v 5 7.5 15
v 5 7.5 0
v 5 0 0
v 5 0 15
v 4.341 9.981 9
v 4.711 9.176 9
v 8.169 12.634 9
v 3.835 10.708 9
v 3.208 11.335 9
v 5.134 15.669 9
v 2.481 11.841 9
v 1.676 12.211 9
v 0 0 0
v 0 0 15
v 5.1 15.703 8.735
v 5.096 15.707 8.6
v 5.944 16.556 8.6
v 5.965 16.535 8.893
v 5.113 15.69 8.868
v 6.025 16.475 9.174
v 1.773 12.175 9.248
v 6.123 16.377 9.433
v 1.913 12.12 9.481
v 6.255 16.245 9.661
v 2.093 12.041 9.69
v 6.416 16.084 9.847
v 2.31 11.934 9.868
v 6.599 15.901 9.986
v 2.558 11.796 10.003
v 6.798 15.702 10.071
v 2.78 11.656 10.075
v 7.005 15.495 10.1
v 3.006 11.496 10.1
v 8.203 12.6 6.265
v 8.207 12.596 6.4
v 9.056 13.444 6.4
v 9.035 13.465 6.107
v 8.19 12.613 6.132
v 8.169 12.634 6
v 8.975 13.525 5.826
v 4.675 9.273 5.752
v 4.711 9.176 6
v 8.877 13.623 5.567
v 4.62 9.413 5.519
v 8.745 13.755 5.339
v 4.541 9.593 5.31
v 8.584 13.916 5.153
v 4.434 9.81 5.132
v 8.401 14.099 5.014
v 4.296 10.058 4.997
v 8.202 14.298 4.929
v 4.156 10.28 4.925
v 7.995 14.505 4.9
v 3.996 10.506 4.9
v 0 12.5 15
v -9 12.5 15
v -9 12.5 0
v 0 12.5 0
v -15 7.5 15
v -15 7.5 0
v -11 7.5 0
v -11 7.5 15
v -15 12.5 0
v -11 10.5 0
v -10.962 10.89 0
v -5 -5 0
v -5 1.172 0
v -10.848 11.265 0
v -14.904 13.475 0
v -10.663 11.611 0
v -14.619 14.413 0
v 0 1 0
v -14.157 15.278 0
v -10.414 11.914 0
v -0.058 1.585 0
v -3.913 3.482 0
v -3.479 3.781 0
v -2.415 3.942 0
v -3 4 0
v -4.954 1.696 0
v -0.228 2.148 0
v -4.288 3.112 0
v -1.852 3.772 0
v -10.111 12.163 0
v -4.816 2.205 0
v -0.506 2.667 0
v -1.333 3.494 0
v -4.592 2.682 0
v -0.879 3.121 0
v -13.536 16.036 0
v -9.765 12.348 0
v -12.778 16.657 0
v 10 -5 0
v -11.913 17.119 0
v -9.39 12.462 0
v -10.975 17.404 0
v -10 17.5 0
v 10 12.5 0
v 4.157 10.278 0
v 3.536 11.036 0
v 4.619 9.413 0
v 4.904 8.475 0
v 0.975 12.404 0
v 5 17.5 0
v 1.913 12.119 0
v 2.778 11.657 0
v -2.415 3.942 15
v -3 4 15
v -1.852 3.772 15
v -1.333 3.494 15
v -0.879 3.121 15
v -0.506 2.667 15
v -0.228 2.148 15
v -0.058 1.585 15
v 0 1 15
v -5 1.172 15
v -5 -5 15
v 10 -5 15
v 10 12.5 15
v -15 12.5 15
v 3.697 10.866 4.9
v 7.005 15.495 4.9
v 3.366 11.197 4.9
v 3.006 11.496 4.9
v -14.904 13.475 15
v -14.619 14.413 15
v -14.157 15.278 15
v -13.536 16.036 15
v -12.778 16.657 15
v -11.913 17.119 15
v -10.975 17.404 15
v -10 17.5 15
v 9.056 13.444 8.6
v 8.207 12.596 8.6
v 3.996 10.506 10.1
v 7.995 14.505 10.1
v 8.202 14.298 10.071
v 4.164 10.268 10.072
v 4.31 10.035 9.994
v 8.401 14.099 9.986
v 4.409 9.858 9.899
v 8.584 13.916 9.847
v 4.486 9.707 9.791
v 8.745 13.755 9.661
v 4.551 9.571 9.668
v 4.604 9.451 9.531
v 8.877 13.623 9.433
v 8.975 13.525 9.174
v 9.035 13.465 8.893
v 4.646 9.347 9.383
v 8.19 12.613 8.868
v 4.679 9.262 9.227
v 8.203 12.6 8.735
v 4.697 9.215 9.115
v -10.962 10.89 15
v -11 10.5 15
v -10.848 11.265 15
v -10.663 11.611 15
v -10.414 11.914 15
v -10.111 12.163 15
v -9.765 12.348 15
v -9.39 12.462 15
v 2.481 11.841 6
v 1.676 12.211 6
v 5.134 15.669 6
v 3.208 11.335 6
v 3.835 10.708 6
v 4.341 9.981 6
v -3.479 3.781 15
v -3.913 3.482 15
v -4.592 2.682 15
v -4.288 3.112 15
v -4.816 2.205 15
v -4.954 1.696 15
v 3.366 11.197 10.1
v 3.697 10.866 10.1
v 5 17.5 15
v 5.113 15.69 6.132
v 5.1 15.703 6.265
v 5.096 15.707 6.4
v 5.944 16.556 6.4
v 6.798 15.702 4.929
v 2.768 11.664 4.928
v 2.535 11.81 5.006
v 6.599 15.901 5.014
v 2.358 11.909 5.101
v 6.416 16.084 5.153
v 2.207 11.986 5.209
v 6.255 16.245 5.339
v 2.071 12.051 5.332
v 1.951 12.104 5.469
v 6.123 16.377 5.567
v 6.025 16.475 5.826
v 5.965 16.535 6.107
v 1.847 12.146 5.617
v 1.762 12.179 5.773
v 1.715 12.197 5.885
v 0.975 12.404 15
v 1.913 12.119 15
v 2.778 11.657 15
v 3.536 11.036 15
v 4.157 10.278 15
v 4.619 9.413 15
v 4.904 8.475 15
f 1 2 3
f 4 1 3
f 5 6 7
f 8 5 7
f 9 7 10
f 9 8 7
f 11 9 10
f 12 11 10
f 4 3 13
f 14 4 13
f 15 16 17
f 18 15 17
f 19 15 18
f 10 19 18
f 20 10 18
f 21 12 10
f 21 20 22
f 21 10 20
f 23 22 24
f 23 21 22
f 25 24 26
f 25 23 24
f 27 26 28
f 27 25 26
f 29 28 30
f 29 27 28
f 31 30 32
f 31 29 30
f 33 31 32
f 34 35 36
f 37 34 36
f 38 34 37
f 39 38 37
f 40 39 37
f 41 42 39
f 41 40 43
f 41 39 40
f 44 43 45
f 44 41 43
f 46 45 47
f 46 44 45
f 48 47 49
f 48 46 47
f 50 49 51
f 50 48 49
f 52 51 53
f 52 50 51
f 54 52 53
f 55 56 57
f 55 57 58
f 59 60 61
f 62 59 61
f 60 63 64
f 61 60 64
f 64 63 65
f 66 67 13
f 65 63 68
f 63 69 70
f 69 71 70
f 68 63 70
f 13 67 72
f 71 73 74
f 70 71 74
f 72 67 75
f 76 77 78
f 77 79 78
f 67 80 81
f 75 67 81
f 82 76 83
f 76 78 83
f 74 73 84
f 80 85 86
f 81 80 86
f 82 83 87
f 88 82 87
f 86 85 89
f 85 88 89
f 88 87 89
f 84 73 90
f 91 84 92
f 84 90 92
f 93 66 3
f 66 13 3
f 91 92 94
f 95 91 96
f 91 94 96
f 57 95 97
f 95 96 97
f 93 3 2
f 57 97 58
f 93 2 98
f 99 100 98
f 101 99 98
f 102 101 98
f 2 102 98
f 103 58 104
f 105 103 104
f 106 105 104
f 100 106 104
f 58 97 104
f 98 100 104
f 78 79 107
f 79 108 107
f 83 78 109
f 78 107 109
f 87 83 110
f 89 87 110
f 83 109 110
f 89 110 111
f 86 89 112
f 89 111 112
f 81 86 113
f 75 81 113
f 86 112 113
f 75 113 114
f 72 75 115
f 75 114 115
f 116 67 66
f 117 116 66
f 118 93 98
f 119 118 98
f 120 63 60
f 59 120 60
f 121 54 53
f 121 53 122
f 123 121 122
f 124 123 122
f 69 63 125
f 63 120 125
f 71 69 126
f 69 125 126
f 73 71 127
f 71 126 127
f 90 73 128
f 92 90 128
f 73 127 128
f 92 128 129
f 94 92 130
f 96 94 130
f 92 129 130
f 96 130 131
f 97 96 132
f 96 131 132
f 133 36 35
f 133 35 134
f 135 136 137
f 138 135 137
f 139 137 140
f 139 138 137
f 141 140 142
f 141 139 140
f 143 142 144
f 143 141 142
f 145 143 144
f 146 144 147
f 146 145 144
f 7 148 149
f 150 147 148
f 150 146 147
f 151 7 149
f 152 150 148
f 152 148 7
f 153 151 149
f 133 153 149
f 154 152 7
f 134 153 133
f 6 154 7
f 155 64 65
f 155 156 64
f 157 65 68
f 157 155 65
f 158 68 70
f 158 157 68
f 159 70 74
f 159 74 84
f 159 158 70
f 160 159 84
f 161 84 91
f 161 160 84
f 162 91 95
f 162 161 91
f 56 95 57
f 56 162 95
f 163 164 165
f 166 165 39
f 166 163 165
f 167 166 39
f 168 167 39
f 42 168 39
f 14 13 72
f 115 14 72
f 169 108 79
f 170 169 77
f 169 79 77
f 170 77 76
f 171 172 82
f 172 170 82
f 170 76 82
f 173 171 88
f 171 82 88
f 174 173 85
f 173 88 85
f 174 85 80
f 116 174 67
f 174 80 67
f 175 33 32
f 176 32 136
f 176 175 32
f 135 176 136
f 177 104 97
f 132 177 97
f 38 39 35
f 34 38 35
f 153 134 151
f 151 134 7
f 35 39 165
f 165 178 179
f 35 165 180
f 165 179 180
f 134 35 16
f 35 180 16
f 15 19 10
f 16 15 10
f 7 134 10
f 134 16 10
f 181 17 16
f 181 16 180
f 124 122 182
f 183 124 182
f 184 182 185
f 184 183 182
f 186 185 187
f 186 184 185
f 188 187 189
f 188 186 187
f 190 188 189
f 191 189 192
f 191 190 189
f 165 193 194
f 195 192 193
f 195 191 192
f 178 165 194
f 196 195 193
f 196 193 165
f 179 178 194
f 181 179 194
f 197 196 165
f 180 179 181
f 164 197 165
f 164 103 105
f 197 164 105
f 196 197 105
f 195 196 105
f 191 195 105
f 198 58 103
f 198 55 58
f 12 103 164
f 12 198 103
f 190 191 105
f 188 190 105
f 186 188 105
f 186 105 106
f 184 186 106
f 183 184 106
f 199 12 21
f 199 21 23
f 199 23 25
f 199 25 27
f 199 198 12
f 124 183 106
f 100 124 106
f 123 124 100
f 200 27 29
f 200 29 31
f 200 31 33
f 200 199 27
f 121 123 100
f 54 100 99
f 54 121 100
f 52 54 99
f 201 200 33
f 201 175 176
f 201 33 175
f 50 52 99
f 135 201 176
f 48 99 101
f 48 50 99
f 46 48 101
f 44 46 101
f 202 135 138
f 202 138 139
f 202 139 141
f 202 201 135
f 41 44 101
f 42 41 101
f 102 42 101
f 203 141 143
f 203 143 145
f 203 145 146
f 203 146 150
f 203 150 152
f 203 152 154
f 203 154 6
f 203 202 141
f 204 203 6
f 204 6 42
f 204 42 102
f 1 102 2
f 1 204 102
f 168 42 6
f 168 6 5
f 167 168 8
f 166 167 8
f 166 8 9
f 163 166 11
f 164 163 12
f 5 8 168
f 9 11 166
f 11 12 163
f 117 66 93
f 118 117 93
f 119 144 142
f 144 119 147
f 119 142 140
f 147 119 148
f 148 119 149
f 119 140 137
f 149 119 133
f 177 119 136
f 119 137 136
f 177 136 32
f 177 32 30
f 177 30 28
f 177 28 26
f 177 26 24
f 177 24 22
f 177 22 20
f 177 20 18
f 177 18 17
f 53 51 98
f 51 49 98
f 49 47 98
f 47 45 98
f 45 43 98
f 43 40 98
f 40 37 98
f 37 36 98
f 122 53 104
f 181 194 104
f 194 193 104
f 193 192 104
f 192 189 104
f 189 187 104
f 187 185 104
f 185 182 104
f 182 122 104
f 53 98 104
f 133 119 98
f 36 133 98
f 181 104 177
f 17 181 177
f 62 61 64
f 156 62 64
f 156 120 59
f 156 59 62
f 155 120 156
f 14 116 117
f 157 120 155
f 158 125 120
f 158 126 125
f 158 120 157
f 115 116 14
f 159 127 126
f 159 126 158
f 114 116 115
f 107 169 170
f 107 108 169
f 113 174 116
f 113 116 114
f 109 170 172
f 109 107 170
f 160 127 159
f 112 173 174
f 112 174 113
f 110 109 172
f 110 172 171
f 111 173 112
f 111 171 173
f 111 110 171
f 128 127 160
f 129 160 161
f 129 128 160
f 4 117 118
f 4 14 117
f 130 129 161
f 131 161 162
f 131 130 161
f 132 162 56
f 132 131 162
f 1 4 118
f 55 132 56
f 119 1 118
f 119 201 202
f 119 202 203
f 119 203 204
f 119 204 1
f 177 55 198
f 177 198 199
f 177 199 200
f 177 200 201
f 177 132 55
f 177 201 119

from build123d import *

# Parameters (mm, degrees)
BOSS_EXTRUDE1_DEPTH     = 15
FILLET1_R               = 5
CUT_EXTRUDE3_DEPTH      = 1.2
CUT_EXTRUDE4_DEPTH      = 35.323825544
CUT_EXTRUDE4_DEPTH_BACK = 10
FILLET2_R               = 3
FILLET3_R               = 3
FILLET4_R               = 5
FILLET5_R               = 2


with BuildPart() as part:
    # Sketch1 → Boss-Extrude1 (new body)
    with BuildSketch(Plane.XY):
        Polygon((0, 0), (0, 4), (-5, 4), (-5, -5), (10, -5), (10, 12.5), (5, 17.5), (-11, 17.5), (-15, 17.5), (-15, 7.5), (-11, 7.5), (-11, 12.5), (5, 12.5), (5, 0), align=None)
    extrude(amount=BOSS_EXTRUDE1_DEPTH)

    # Fillet1
    fillet1_edges = [part.edges().sort_by_distance(p)[0] for p in [
        (5, 12.5, 7.5),
    ]]
    fillet(fillet1_edges, radius=FILLET1_R)

    # Sketch2 → Cut-Extrude3 (cut)
    with BuildSketch(Plane(origin=(11.25, 11.25, 0), x_dir=(0, 0, -1), z_dir=(0.7071067811865487, 0.7071067811865465, 0))):
        with BuildLine():
            Line((-8.6, 7.503300859), (-6.4, 7.503300859))
            ThreePointArc((-6.4, 7.503300859), (-5.339339828, 7.063961031), (-4.9, 6.003300859))
            Line((-4.9, 6.003300859), (-4.9, 4.603300859))
            ThreePointArc((-4.9, 4.603300859), (-5.339339828, 3.542640687), (-6.4, 3.103300859))
            Line((-6.4, 3.103300859), (-8.6, 3.103300859))
            ThreePointArc((-8.6, 3.103300859), (-9.660660172, 3.542640687), (-10.1, 4.603300859))
            Line((-10.1, 4.603300859), (-10.1, 6.003300859))
            ThreePointArc((-10.1, 6.003300859), (-9.660660172, 7.063961031), (-8.6, 7.503300859))
        make_face()
    extrude(amount=-CUT_EXTRUDE3_DEPTH, mode=Mode.SUBTRACT)

    # Sketch2<5> → Cut-Extrude4 (cut, two sides: drawn at the far end of the back side and taken through both)
    with BuildSketch(Plane(origin=(11.25, 11.25, 0), x_dir=(0, 0, -1), z_dir=(0.7071067811865487, 0.7071067811865465, 0)).offset(-CUT_EXTRUDE4_DEPTH_BACK)):
        with BuildLine():
            Line((-9, 3.157617629), (-9, 7.448984088))
            ThreePointArc((-9, 7.448984088), (-9.793733639, 6.911595965), (-10.1, 6.003300859))
            Line((-10.1, 6.003300859), (-10.1, 4.603300859))
            ThreePointArc((-10.1, 4.603300859), (-9.793733639, 3.695005753), (-9, 3.157617629))
        make_face()
        with BuildLine():
            ThreePointArc((-4.9, 6.003300859), (-5.206266361, 6.911595965), (-6, 7.448984088))
            Line((-6, 7.448984088), (-6, 3.157617629))
            ThreePointArc((-6, 3.157617629), (-5.206266361, 3.695005753), (-4.9, 4.603300859))
            Line((-4.9, 4.603300859), (-4.9, 6.003300859))
        make_face()
    extrude(amount=CUT_EXTRUDE4_DEPTH + CUT_EXTRUDE4_DEPTH_BACK, mode=Mode.SUBTRACT)

    # Fillet2
    fillet2_edges = [part.edges().sort_by_distance(p)[0] for p in [
        (0, 4, 7.5),
    ]]
    fillet(fillet2_edges, radius=FILLET2_R)

    # Fillet3
    # the kernel refuses this fillet: 3 mm, written as the material it takes off along each edge
    with BuildSketch(Plane(origin=(-5, 4, -7.071067812), x_dir=(1, 0, 0), z_dir=(0, 0, 1))) as fillet3_piece_1:
        with BuildLine():
            CenterArc((3, -2.828427125), FILLET3_R, 109.471220634, 70.528779366)
            Line((0, -2.828427125), (-0.06, -2.828427125))
            Line((-0.06, -2.828427125), (-0.06, 0))
            Line((-0.06, 0), (0, 0.06))
            ThreePointArc((0, 0.06), (1, 0.06), (1.98, 0.056568542))
            Line((1.98, 0.056568542), (2, 0))
        make_face()
    extrude(amount=29.142135624, mode=Mode.SUBTRACT)

    # Fillet4
    fillet4_edges = [part.edges().sort_by_distance(p)[0] for p in [
        (-15, 17.5, 7.5),
    ]]
    fillet(fillet4_edges, radius=FILLET4_R)

    # Fillet5
    fillet5_edges = [part.edges().sort_by_distance(p)[0] for p in [
        (-11, 12.5, 7.5),
    ]]
    fillet(fillet5_edges, radius=FILLET5_R)


solid = part.part
